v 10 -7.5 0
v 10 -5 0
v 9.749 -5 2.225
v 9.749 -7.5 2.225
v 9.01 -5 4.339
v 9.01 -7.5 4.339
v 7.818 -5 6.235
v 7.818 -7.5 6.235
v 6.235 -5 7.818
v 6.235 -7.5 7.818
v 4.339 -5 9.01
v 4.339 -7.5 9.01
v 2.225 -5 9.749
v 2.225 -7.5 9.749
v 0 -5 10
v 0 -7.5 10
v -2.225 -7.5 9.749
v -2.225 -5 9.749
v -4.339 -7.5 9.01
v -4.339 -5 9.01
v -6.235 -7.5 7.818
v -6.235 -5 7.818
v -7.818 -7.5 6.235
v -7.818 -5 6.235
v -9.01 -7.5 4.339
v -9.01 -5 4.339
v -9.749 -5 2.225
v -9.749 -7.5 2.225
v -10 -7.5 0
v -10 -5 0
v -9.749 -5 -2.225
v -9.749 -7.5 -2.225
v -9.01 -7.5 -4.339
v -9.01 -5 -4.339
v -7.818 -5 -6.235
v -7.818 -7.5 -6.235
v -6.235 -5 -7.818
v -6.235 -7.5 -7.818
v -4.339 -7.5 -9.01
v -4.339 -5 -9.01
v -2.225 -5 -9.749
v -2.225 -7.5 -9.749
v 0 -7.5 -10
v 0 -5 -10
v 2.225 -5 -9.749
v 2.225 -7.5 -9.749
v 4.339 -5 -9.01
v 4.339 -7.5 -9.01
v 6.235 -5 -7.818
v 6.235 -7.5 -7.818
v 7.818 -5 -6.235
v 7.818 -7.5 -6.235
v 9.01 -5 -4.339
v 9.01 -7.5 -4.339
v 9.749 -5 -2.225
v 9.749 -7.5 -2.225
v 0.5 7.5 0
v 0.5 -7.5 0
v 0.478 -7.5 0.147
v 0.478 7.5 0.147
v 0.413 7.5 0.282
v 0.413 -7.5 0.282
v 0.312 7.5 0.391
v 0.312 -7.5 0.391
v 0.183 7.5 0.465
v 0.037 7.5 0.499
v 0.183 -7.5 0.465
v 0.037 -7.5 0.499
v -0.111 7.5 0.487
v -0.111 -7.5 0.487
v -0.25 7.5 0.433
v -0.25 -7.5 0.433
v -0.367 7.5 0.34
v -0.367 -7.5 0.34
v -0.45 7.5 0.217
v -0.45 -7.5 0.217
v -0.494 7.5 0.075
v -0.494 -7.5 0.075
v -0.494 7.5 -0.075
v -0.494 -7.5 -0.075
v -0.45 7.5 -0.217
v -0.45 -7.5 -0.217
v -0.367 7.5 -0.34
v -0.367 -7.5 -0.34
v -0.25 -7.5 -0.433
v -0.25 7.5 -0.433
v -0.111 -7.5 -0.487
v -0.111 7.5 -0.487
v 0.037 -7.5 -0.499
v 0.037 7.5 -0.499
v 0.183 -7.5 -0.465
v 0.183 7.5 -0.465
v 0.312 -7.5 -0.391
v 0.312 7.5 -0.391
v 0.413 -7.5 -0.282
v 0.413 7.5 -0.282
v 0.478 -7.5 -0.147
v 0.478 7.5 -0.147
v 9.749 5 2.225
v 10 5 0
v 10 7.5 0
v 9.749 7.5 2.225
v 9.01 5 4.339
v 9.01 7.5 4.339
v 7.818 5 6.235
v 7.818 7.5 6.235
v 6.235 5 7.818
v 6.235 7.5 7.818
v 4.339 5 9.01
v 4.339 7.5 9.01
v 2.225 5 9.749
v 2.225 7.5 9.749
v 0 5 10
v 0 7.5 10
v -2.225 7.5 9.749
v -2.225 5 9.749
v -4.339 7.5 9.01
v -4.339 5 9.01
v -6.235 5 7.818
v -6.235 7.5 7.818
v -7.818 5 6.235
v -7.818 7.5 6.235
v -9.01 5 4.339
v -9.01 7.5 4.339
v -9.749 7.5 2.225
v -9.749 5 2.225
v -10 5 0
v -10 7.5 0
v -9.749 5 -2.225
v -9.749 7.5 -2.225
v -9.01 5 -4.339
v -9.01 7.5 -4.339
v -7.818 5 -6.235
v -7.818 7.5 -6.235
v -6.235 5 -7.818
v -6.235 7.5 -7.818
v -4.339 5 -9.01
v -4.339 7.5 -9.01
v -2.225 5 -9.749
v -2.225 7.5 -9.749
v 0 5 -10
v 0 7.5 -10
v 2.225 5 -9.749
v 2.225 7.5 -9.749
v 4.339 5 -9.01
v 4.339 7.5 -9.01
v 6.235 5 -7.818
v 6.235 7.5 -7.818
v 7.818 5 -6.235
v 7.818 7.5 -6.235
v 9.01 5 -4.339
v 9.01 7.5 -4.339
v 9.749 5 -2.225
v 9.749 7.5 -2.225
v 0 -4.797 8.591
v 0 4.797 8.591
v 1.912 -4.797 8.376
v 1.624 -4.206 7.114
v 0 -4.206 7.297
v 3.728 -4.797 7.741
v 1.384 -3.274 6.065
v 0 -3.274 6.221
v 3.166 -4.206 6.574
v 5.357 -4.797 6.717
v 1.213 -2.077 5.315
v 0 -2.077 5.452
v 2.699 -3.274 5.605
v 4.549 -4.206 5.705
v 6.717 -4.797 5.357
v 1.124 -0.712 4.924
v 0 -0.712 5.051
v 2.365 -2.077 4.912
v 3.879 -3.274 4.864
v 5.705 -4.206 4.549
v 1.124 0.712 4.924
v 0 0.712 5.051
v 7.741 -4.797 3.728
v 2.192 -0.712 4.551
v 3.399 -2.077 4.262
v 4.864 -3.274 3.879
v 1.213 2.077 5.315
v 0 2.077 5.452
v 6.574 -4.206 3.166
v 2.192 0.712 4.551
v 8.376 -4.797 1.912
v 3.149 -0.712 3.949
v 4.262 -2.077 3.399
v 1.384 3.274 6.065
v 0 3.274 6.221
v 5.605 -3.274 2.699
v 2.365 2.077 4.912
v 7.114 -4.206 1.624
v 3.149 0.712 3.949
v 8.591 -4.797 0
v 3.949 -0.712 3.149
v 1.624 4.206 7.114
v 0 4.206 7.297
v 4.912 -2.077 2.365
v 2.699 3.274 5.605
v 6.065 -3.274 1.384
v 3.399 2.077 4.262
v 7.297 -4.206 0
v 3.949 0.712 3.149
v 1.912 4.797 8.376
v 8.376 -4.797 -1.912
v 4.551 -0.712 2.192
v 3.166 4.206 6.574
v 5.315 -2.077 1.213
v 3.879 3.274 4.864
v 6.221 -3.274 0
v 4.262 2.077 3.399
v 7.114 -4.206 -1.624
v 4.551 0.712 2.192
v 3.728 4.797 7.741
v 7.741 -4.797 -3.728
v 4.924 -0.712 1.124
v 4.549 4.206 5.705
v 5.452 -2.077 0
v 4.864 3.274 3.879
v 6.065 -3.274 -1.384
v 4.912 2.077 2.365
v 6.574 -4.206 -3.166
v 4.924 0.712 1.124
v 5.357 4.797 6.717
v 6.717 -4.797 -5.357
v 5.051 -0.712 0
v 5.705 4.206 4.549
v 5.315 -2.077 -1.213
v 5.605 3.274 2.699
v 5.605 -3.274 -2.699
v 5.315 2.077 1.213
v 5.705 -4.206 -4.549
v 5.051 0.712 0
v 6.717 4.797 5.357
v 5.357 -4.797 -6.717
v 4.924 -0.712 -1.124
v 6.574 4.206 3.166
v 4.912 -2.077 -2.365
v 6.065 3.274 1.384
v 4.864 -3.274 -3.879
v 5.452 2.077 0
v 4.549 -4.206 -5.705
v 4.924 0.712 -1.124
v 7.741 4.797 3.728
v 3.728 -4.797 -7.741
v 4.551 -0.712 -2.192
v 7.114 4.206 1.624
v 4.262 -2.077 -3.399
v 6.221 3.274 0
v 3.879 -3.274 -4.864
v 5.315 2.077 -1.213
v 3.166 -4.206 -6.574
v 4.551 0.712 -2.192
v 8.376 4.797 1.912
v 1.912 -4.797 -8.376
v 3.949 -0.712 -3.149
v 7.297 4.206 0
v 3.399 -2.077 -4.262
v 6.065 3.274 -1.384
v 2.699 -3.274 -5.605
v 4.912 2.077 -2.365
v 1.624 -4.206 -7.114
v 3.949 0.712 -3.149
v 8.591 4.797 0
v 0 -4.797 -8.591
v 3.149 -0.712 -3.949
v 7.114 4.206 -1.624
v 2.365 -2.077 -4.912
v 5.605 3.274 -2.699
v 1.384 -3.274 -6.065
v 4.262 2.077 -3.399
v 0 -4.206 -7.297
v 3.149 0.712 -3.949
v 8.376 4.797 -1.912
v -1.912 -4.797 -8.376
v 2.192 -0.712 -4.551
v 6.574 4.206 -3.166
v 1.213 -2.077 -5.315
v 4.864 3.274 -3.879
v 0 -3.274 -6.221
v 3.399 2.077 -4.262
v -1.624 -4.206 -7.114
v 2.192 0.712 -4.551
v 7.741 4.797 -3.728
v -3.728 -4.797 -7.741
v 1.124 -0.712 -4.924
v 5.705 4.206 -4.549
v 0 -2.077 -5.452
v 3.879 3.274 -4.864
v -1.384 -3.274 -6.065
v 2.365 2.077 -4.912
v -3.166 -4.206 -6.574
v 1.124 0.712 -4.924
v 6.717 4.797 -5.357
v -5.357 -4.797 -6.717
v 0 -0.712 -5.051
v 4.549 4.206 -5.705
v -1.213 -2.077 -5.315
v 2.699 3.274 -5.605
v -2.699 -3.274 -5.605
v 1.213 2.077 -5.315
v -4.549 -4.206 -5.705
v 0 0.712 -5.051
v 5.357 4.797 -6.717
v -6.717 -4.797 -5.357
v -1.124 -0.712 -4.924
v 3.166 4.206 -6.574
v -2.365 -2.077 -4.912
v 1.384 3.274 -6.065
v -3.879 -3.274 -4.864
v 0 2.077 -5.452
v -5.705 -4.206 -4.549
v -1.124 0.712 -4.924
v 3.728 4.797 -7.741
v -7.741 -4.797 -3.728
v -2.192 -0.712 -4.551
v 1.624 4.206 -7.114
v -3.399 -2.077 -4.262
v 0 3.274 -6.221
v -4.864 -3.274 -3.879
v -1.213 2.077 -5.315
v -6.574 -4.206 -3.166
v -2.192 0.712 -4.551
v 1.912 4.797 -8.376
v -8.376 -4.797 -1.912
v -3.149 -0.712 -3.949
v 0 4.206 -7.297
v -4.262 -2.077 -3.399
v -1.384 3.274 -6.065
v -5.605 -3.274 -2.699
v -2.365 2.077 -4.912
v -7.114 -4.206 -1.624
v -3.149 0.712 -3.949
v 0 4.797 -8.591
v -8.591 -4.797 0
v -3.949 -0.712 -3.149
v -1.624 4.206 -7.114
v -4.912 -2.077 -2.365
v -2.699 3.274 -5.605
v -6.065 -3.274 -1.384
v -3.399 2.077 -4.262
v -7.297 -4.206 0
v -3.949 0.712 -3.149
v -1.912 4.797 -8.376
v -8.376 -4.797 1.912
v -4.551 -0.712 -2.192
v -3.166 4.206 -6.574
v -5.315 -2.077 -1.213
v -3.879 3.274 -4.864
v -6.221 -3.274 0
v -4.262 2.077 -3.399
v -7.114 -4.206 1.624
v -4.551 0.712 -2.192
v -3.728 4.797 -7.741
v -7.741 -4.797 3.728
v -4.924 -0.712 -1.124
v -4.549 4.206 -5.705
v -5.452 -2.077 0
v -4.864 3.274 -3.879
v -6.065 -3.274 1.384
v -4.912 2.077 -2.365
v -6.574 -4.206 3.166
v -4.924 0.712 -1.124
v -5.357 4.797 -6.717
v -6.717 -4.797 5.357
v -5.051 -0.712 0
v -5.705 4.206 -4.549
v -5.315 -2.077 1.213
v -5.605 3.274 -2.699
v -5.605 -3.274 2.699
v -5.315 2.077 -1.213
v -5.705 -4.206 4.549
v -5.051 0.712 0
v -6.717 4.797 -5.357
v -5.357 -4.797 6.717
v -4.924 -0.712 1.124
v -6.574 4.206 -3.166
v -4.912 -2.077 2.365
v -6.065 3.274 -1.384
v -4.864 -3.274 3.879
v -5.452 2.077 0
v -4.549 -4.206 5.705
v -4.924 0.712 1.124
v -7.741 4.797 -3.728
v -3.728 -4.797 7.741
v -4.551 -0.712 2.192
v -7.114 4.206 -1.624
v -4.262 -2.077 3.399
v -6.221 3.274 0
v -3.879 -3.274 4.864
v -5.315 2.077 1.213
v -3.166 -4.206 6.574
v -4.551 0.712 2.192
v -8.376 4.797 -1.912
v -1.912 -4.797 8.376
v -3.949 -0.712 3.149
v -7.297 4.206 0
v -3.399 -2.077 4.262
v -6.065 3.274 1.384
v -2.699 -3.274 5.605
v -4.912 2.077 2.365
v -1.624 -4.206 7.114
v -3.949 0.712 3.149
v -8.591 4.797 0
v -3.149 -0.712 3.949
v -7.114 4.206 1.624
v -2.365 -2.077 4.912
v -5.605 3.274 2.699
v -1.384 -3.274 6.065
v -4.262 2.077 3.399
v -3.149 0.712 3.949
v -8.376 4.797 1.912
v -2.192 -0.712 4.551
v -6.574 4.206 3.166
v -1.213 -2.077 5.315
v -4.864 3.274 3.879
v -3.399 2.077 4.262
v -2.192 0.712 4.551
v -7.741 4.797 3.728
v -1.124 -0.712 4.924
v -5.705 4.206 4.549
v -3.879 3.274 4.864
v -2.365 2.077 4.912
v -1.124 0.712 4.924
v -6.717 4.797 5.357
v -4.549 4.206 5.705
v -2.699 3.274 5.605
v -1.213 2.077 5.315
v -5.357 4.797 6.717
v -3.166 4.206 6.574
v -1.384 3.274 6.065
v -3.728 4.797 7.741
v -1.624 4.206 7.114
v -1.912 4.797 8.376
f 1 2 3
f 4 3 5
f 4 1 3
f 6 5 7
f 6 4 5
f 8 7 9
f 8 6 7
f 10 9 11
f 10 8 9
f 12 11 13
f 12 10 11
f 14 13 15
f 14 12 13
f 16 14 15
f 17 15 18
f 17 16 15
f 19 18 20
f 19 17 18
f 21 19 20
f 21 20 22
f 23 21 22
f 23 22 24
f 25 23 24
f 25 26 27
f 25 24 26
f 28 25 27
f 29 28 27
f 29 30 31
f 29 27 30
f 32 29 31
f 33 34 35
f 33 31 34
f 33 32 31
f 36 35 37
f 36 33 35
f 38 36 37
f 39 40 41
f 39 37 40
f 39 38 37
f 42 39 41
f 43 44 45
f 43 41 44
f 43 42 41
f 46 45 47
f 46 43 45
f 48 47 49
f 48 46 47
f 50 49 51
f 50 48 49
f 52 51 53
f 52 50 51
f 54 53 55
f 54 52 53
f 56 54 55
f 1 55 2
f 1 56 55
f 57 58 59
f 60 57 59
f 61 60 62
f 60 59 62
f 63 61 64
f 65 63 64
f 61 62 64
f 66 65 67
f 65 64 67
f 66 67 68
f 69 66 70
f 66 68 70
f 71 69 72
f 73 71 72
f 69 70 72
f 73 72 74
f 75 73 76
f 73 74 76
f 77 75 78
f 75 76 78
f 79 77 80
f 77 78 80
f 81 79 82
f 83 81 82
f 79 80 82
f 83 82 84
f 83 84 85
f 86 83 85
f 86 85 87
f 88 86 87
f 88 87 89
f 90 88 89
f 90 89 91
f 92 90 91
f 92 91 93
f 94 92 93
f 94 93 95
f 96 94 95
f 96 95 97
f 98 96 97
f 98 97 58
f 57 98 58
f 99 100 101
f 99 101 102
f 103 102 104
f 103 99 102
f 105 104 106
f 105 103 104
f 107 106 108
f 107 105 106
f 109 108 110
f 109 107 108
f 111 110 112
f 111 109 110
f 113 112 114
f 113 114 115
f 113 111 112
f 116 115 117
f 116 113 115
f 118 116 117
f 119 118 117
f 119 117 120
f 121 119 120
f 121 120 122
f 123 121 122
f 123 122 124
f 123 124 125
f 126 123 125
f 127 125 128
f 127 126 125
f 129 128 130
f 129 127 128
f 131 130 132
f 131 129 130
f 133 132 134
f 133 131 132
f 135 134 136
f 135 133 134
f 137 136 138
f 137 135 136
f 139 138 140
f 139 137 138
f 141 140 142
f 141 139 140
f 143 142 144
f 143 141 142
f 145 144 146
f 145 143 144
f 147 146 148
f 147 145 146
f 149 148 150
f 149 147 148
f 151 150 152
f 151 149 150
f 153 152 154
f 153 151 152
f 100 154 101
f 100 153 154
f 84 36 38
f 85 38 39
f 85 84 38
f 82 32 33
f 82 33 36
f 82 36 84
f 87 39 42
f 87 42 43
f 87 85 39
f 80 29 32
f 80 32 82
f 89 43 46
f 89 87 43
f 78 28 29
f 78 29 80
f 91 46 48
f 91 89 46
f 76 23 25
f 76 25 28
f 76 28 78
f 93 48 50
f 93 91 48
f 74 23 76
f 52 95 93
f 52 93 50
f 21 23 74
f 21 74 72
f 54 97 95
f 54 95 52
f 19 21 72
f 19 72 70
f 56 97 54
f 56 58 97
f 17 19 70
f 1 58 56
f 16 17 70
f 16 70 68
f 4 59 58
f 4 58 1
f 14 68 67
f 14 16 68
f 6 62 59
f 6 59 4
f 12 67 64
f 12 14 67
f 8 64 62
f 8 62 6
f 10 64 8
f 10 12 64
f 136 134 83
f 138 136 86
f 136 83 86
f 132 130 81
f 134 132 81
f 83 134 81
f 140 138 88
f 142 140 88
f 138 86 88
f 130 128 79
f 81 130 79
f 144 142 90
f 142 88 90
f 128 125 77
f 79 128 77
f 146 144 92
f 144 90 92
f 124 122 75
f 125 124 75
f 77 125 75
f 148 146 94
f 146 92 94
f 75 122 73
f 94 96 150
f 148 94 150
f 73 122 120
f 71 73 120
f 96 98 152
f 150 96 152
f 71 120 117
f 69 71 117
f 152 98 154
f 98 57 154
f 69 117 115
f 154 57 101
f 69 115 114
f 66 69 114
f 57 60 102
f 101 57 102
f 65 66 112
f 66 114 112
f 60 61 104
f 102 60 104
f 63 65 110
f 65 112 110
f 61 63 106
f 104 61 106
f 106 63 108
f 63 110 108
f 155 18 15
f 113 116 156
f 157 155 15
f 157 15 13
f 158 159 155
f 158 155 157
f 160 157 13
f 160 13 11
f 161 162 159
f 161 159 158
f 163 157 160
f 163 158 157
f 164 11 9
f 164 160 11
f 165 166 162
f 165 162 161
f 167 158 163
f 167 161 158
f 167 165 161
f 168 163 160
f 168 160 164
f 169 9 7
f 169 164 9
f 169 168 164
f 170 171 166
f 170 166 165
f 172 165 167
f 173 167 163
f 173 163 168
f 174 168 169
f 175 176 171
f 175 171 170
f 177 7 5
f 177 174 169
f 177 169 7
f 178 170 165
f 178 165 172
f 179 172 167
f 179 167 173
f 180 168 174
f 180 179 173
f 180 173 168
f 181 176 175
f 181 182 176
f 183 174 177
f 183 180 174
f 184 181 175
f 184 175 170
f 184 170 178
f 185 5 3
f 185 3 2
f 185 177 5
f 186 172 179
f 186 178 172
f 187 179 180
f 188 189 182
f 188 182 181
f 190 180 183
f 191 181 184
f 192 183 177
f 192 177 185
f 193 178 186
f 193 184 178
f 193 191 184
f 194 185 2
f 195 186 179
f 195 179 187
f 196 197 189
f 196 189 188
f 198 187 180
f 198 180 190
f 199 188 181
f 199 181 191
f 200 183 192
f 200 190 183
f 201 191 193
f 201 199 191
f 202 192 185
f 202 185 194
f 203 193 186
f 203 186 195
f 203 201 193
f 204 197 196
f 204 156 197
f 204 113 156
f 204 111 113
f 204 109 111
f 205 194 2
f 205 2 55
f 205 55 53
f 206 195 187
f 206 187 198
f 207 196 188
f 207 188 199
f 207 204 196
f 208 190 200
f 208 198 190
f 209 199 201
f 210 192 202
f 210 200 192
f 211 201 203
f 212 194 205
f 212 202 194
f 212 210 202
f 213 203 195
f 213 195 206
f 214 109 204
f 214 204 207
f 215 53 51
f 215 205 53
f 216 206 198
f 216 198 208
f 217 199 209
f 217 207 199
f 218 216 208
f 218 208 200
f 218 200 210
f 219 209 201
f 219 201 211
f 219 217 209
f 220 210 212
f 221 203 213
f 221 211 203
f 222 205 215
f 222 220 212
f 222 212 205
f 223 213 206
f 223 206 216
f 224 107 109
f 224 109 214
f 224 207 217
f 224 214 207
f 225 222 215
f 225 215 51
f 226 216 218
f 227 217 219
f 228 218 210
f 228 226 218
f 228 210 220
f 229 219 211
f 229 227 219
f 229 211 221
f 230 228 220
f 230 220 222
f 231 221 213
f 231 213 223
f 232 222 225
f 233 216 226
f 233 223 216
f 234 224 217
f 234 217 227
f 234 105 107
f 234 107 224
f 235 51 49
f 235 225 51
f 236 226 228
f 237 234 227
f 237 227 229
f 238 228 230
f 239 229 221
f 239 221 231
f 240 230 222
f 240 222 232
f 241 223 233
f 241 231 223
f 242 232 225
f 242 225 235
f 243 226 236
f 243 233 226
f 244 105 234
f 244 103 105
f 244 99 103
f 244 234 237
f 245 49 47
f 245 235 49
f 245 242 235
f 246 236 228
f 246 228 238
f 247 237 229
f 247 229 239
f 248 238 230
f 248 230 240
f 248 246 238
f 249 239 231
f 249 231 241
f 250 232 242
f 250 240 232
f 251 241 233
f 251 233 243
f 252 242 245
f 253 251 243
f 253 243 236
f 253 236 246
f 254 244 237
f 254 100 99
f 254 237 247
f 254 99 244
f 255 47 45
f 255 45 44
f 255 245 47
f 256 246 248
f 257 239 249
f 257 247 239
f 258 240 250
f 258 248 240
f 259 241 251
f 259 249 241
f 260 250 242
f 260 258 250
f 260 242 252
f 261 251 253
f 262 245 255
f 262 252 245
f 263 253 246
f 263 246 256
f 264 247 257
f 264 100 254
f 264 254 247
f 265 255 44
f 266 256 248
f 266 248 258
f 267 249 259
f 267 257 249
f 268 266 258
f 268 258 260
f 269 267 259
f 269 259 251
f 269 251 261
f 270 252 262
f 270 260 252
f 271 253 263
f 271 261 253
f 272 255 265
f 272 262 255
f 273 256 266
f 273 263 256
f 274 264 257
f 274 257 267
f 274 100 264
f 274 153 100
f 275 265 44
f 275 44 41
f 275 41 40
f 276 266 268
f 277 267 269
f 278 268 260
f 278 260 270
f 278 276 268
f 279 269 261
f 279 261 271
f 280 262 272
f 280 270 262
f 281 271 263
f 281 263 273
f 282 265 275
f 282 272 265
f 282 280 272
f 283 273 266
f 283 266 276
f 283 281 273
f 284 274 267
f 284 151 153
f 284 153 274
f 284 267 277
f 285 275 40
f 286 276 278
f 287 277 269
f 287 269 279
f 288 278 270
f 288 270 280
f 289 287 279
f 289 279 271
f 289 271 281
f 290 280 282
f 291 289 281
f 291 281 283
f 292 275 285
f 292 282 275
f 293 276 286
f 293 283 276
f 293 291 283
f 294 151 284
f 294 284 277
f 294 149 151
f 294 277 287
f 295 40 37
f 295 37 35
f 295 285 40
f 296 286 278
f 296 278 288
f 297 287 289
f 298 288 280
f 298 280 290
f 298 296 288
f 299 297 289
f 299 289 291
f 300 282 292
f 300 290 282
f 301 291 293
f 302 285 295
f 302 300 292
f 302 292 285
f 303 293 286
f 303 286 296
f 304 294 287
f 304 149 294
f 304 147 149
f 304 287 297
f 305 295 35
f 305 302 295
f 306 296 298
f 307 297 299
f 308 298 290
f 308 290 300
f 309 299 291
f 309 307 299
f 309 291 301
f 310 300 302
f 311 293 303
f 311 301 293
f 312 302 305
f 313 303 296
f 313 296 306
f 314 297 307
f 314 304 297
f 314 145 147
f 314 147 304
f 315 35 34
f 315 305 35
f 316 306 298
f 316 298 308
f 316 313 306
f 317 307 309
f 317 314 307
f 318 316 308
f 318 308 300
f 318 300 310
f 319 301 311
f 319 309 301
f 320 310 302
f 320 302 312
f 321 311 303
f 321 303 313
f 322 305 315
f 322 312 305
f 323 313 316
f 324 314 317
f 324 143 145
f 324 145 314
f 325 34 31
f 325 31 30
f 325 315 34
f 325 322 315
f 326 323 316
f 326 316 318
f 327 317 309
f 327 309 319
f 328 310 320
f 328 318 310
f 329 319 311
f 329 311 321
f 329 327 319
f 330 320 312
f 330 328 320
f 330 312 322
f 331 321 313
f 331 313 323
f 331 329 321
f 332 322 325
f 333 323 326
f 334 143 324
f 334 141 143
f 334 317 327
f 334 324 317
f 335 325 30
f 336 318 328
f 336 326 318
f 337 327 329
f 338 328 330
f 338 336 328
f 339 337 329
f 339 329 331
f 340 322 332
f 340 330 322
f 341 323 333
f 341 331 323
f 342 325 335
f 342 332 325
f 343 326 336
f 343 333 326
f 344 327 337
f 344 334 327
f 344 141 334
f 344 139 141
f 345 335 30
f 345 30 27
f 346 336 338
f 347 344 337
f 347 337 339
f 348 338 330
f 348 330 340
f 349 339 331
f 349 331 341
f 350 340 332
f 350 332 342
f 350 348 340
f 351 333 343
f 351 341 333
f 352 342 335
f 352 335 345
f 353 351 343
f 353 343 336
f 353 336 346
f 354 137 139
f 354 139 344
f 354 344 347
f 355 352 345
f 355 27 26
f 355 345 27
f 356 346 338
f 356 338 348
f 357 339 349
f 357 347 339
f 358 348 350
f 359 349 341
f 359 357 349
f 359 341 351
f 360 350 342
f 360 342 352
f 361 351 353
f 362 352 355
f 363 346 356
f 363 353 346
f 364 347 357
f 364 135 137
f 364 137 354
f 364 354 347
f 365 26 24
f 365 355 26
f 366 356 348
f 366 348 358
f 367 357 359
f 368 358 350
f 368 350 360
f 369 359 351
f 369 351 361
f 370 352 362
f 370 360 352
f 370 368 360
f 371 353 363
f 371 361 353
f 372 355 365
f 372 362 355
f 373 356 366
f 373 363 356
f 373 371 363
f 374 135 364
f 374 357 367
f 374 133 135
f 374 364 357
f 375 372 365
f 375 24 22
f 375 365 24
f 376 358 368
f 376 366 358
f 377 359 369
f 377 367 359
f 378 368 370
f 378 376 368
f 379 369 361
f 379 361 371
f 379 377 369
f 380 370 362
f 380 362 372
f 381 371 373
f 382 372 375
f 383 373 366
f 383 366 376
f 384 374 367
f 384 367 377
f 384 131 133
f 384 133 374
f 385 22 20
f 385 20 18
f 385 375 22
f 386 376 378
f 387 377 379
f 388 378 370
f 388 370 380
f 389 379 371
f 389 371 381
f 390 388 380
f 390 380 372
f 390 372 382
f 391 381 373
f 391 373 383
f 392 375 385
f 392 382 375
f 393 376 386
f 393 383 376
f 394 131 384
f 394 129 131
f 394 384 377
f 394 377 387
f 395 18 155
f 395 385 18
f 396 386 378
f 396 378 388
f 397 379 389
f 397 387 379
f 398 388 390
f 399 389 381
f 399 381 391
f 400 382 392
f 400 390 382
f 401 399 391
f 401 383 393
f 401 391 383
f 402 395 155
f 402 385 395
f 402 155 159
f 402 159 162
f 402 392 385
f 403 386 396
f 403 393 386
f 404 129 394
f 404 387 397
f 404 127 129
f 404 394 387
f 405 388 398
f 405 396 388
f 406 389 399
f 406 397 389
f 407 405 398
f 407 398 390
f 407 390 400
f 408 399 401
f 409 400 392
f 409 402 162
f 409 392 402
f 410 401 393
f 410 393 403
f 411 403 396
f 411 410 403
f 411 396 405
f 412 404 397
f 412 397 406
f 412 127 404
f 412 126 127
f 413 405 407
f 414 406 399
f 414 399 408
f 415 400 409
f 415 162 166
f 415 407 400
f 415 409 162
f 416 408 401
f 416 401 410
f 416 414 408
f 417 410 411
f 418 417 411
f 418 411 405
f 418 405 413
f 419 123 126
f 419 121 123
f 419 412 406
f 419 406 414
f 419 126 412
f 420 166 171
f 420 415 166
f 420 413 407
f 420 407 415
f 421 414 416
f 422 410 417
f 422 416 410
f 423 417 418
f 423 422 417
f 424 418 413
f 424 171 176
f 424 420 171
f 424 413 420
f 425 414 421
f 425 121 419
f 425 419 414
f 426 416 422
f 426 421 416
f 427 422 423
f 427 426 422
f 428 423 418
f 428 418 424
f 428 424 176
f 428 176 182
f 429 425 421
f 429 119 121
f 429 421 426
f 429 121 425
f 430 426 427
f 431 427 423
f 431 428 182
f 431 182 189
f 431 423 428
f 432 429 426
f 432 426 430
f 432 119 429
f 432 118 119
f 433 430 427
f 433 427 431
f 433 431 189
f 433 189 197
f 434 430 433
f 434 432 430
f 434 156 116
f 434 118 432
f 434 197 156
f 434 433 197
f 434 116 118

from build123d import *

# Parameters (mm, degrees)
F0_R     = 10
F1_DEPTH = 7.5
F5_R     = 0.5
F6_DEPTH = 15.001


with BuildPart() as f1:
    # F0 (on Front) → F1 (new body, symmetric)
    with BuildSketch(Plane.XZ):
        Circle(F0_R)
    extrude(amount=F1_DEPTH, both=True)

    # F2 (on Right) → F4 (revolve, cut)
    with BuildSketch(Plane.YZ):
        with BuildLine():
            Line((5, 10), (-5, 10))
            ThreePointArc((-5, 10), (0, 5), (5, 10))
        make_face()
    revolve(axis=Axis((0, -5.833439, 0), (0, 1, 0)), mode=Mode.SUBTRACT)

    # F5 (on face) → F6 (cut, through all)
    with BuildSketch(Plane.XZ.offset(7.5)):
        Circle(F5_R)
    extrude(amount=-F6_DEPTH, mode=Mode.SUBTRACT)


solid = f1.part
